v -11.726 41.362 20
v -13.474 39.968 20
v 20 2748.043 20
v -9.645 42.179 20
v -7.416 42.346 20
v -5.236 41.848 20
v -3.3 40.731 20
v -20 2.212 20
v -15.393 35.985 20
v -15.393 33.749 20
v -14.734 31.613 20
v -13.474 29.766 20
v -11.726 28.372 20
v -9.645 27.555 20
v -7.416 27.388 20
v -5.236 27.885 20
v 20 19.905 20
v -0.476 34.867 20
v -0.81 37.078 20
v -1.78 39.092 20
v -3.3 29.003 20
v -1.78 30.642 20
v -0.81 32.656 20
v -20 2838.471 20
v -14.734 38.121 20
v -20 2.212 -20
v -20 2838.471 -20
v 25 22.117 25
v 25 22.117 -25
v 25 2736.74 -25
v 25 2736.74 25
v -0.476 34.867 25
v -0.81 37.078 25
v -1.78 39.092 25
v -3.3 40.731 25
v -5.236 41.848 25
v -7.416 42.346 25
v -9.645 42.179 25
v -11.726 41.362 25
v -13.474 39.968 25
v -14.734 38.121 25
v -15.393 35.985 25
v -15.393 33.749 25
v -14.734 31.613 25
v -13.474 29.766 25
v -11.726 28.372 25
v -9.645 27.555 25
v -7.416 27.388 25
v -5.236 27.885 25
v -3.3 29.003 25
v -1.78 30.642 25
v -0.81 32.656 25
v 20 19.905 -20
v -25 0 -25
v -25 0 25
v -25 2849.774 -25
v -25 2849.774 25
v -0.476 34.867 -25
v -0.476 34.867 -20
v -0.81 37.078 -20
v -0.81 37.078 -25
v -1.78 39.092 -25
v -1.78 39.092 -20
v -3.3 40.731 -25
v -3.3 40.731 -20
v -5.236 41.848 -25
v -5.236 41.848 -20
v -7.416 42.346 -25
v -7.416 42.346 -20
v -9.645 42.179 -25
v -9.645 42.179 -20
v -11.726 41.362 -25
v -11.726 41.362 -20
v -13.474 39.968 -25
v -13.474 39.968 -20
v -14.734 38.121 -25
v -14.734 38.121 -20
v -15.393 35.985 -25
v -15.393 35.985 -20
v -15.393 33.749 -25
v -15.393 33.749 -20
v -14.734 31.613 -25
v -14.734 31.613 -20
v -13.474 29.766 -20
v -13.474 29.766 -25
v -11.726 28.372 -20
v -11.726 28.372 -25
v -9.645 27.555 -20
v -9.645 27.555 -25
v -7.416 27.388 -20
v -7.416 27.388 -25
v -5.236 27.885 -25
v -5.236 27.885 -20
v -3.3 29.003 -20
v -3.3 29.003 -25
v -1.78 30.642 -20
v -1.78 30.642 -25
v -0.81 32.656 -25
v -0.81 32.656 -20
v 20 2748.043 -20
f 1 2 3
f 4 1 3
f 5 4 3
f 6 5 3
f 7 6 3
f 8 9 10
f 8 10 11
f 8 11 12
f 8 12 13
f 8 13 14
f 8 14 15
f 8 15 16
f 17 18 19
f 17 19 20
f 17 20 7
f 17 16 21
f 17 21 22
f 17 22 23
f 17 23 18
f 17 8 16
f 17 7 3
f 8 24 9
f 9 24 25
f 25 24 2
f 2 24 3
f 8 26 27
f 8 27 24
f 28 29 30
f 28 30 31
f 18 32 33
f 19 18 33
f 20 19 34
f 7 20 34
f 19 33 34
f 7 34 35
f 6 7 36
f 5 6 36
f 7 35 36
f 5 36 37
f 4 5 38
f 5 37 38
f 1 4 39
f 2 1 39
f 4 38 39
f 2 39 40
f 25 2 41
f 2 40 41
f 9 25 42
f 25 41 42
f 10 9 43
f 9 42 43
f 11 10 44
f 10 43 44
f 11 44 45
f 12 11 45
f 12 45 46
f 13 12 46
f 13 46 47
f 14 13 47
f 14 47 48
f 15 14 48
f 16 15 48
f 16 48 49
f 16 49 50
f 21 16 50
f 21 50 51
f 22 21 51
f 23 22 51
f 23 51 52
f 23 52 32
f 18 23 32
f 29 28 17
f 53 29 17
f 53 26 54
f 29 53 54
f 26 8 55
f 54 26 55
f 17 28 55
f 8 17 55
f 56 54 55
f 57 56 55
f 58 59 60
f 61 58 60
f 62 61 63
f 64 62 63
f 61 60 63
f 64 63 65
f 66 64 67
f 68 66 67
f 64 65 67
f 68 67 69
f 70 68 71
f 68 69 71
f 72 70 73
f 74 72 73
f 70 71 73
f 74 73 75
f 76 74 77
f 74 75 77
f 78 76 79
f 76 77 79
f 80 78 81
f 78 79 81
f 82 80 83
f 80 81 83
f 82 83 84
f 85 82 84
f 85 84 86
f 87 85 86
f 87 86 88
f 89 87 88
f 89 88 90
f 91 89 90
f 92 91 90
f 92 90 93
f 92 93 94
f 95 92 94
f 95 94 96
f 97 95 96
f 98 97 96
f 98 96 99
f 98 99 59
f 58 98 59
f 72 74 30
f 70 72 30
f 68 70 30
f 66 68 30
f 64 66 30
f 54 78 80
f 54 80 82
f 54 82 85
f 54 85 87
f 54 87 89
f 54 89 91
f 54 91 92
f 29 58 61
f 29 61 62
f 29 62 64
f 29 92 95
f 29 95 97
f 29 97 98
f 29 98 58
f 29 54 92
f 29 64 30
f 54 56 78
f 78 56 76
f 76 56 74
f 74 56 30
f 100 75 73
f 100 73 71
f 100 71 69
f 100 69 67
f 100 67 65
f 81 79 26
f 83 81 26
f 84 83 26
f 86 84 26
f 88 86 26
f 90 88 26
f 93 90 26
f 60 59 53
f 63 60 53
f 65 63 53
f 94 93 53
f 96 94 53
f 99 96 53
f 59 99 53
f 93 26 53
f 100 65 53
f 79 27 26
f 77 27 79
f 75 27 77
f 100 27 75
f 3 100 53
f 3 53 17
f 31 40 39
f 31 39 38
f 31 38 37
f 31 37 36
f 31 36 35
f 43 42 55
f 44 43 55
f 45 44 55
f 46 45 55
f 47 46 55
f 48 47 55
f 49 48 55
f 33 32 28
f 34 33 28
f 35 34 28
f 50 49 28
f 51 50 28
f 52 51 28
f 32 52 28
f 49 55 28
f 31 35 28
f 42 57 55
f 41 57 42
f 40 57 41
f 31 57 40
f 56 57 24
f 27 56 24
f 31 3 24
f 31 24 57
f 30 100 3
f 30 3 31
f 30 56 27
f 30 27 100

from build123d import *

# Parameters (mm, degrees)
F0_W          = 50
F0_H          = 50
F0_W_2        = 40
F0_H_2        = 40
F1_DEPTH      = 3000
F3_DEPTH      = 25.001
F3_DEPTH_BACK = 25.001
F4_R          = 7.5
F5_DEPTH      = 50.001


with BuildPart() as f1:
    # F0 (on Front) → F1 (new body)
    with BuildSketch(Plane.XZ):
        Rectangle(F0_W, F0_H)
        Rectangle(F0_W_2, F0_H_2, mode=Mode.SUBTRACT)
    extrude(amount=-F1_DEPTH)

    # F2 (on Top) → F3 (cut, two sides)
    with BuildSketch(Plane.XY) as f3_sk:
        Polygon((-25, 3000), (-25, 2849.7744184879), (25, 2736.739757117), (25, 3000), align=None)
        Polygon((25, 22.1171096519), (-25, 0), (25, 0), align=None)
    extrude(amount=-F3_DEPTH, mode=Mode.SUBTRACT)
    extrude(f3_sk.sketch, amount=F3_DEPTH_BACK, mode=Mode.SUBTRACT)

    # F4 (on face) → F5 (cut, through all)
    with BuildSketch(Plane.XY.offset(25)):
        with Locations((-7.9764017243, 34.8668911918)):
            Circle(F4_R)
    extrude(amount=-F5_DEPTH, mode=Mode.SUBTRACT)


solid = f1.part
